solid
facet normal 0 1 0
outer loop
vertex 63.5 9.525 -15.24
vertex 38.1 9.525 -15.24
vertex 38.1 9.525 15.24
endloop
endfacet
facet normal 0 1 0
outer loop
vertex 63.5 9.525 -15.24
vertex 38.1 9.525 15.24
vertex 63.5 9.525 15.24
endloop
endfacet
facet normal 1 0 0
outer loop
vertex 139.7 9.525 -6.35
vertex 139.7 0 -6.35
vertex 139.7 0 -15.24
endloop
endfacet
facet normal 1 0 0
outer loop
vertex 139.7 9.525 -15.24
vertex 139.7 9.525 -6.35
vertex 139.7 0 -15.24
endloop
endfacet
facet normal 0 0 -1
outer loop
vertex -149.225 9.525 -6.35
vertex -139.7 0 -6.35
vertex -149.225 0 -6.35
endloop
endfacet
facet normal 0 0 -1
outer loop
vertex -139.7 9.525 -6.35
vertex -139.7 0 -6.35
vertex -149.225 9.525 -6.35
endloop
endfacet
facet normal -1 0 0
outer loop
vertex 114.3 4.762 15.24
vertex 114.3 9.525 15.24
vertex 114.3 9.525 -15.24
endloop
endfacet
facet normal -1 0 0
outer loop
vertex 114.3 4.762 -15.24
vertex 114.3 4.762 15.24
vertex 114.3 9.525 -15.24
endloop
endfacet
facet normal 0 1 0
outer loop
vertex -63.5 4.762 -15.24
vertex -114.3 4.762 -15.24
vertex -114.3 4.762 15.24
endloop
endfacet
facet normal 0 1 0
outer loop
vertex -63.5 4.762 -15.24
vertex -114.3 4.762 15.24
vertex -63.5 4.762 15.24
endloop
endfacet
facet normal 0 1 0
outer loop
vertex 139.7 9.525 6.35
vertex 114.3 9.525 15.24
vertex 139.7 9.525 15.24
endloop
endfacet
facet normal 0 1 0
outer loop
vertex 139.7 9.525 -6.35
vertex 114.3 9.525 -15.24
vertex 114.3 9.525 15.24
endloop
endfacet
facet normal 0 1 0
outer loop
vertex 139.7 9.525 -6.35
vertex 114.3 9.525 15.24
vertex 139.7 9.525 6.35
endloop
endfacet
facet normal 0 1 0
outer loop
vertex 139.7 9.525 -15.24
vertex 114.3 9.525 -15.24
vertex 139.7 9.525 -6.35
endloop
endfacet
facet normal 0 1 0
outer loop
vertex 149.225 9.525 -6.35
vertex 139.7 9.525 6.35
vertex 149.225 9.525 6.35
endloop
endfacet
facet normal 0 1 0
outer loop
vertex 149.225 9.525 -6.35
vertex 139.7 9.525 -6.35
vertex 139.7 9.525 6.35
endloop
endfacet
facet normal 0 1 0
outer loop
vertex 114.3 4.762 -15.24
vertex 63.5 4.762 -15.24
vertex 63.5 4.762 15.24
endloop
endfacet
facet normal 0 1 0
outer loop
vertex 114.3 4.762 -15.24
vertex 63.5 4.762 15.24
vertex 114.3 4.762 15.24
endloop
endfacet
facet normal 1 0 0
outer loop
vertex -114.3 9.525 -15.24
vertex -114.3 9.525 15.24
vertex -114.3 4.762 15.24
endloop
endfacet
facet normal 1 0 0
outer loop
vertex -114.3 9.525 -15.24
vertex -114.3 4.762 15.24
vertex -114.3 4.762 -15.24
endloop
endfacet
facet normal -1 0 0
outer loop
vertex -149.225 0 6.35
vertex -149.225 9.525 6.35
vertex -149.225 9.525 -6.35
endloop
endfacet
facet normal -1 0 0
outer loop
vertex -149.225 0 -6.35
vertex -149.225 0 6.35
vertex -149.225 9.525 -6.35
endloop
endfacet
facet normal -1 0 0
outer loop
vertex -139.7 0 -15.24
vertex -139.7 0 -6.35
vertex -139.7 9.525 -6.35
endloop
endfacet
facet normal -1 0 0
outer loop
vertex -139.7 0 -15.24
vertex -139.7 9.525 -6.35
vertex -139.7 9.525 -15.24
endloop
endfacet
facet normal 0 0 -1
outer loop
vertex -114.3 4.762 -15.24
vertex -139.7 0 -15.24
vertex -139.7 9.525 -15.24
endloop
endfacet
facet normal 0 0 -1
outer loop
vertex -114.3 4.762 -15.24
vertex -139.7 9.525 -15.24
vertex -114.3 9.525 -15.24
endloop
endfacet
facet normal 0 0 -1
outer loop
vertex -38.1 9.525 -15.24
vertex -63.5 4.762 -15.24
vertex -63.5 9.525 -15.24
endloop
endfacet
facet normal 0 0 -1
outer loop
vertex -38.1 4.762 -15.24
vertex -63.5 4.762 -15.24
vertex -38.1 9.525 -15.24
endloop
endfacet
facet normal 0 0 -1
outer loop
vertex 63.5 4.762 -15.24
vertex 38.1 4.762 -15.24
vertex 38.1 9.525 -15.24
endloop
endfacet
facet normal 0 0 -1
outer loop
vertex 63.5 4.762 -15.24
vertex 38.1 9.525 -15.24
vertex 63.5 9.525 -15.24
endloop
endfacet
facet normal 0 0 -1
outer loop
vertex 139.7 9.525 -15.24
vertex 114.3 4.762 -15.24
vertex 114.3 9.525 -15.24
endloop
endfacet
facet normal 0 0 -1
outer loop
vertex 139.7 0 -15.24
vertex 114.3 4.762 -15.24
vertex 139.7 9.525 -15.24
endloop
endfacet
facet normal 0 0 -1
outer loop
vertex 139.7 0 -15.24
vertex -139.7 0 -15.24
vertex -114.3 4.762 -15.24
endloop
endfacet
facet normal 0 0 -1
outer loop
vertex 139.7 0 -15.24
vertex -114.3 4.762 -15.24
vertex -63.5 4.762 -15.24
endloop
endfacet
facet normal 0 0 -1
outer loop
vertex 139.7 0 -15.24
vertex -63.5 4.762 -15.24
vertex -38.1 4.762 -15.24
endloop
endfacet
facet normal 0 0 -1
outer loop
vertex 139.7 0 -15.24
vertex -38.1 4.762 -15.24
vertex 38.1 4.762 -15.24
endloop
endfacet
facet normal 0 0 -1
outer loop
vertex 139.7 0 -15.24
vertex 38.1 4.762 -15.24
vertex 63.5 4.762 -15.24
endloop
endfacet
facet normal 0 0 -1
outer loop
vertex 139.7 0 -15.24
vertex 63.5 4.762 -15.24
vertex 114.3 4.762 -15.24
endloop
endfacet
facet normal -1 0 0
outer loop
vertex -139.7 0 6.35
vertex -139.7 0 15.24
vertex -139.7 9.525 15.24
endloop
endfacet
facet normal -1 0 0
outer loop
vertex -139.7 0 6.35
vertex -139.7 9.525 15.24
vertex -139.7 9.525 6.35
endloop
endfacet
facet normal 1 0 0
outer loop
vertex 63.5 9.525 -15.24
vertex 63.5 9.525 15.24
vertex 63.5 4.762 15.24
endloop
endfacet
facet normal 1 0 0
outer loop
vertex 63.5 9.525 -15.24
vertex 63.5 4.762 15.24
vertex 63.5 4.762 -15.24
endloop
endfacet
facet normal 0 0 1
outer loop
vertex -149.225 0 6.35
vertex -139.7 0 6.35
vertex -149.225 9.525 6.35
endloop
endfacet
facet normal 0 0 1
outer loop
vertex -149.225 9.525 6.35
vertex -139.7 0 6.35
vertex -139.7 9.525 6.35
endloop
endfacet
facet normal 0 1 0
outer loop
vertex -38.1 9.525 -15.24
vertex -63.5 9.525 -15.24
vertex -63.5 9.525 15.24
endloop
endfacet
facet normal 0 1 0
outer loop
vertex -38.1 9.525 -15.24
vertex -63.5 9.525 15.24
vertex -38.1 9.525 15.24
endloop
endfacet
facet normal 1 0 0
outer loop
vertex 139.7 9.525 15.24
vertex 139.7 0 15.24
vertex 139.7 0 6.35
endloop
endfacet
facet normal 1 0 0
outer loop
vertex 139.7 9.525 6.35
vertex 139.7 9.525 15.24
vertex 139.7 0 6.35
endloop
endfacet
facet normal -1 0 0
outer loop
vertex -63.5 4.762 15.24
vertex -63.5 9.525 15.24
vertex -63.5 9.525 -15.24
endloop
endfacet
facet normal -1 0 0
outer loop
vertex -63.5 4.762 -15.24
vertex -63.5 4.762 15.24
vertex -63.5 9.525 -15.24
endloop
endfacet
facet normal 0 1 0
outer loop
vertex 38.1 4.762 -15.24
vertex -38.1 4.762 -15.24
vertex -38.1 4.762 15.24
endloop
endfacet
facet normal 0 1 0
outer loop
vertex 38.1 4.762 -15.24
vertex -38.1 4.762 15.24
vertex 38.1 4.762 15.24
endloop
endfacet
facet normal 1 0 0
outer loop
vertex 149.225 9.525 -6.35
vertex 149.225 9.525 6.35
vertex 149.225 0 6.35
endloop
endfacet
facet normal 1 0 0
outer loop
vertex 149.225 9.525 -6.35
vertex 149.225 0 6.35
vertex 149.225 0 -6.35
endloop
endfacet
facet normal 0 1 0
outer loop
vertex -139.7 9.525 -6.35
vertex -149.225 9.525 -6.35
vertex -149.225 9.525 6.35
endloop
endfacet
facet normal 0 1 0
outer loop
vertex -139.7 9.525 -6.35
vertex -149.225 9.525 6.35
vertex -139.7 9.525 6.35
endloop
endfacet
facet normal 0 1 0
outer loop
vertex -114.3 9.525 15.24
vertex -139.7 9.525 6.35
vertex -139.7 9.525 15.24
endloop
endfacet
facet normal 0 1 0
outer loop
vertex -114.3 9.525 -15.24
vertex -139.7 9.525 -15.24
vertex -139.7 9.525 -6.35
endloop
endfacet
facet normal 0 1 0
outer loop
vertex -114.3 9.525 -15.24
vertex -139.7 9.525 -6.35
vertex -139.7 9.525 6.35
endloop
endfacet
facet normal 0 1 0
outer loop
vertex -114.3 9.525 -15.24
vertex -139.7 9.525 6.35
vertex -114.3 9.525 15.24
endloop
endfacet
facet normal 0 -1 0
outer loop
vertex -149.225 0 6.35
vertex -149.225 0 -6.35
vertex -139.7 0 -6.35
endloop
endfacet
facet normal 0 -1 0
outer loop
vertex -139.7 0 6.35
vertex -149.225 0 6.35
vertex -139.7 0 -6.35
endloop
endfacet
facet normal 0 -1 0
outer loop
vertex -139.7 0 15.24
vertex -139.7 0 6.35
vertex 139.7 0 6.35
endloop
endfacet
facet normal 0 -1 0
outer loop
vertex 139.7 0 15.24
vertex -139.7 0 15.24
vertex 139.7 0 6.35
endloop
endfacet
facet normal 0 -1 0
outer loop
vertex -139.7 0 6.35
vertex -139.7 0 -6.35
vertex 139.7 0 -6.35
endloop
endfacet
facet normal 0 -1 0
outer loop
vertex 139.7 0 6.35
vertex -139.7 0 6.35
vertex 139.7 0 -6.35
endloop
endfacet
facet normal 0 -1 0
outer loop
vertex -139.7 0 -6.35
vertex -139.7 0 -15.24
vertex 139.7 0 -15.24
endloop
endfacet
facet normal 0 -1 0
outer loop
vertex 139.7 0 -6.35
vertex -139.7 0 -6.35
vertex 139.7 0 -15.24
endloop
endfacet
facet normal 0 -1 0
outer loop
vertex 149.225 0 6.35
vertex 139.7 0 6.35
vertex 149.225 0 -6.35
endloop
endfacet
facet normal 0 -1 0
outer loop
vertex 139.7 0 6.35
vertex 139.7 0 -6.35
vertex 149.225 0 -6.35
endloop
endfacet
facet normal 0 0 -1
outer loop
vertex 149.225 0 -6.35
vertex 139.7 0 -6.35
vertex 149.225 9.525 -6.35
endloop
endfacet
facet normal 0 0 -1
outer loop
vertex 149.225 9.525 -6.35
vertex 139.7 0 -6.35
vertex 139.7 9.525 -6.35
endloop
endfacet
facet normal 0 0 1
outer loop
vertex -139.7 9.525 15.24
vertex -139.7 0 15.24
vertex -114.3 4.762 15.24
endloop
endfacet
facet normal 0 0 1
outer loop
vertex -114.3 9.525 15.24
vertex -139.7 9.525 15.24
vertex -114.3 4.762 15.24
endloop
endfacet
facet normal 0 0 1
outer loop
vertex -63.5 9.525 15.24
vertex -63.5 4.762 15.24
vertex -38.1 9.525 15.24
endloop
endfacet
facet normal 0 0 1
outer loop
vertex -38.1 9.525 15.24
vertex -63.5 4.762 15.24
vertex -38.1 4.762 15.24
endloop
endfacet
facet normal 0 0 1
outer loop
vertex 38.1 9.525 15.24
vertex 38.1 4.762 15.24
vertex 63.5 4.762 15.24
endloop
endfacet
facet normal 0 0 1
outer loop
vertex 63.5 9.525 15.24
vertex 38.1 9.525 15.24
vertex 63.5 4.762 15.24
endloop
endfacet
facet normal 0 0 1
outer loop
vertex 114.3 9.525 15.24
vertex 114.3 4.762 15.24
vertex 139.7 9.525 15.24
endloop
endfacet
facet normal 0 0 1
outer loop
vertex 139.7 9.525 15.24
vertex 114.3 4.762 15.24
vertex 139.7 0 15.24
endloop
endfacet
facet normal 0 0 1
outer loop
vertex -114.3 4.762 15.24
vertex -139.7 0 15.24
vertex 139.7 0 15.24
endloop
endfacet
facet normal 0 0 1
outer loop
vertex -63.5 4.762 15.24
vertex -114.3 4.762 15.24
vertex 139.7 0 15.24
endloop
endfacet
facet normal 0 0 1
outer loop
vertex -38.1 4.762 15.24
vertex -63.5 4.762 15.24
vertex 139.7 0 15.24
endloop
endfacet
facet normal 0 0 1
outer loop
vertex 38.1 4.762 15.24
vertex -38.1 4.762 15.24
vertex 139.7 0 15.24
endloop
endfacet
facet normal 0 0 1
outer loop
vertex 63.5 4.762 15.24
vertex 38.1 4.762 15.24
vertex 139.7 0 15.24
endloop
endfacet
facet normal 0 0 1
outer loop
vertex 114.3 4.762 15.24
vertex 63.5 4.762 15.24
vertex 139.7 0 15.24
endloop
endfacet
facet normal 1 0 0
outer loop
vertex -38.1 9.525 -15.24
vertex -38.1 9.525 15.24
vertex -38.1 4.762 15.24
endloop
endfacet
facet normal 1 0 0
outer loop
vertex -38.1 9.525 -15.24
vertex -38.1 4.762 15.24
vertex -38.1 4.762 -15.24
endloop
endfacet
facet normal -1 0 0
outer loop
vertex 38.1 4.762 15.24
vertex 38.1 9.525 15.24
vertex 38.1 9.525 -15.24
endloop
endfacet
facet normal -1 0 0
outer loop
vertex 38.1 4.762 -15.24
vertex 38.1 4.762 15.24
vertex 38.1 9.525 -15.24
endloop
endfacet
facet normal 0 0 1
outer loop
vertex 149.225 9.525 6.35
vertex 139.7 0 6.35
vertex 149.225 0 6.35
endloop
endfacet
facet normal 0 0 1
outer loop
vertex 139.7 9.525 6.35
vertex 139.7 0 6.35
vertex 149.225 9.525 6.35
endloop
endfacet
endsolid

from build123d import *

# Parameters (mm, degrees)
SKETCH1_W           = 279.4
SKETCH1_H           = 30.48
BOSS_EXTRUDE1_DEPTH = 9.525
SKETCH2_W           = 12.7
SKETCH2_H           = 9.525
BOSS_EXTRUDE2_DEPTH = 9.525
SKETCH4_W           = 76.2
SKETCH4_H           = 30.48
SKETCH4_W_2         = 50.8
CUT_EXTRUDE1_DEPTH  = 4.7625


with BuildPart() as part:
    # Sketch1 → Boss-Extrude1 (new body)
    with BuildSketch(Plane(origin=(0, 0, 0), x_dir=(1, 0, 0), z_dir=(0, 1, 0))):
        Rectangle(SKETCH1_W, SKETCH1_H)
    extrude(amount=BOSS_EXTRUDE1_DEPTH)

    # Sketch2 → Boss-Extrude2 (add)
    with BuildSketch(Plane(origin=(139.7, 0, 0), x_dir=(0, 0, -1), z_dir=(1, 0, 0))):
        with Locations((0, 4.7625)):
            Rectangle(SKETCH2_W, SKETCH2_H)
    boss_extrude2 = extrude(amount=BOSS_EXTRUDE2_DEPTH)

    # Mirror1: Boss-Extrude2 across plane
    add(boss_extrude2.mirror(Plane(origin=(0, 0, 0), x_dir=(0, 0, 1), z_dir=(1, 0, 0))))

    # Sketch4 → Cut-Extrude1 (cut)
    with BuildSketch(Plane(origin=(0, 9.525, 0), x_dir=(1, 0, 0), z_dir=(0, 1, 0))):
        Rectangle(SKETCH4_W, SKETCH4_H)
        with Locations((88.9, 0)):
            Rectangle(SKETCH4_W_2, SKETCH4_H)
        with Locations((-88.9, 0)):
            Rectangle(SKETCH4_W_2, SKETCH4_H)
    extrude(amount=-CUT_EXTRUDE1_DEPTH, mode=Mode.SUBTRACT)


solid = part.part
